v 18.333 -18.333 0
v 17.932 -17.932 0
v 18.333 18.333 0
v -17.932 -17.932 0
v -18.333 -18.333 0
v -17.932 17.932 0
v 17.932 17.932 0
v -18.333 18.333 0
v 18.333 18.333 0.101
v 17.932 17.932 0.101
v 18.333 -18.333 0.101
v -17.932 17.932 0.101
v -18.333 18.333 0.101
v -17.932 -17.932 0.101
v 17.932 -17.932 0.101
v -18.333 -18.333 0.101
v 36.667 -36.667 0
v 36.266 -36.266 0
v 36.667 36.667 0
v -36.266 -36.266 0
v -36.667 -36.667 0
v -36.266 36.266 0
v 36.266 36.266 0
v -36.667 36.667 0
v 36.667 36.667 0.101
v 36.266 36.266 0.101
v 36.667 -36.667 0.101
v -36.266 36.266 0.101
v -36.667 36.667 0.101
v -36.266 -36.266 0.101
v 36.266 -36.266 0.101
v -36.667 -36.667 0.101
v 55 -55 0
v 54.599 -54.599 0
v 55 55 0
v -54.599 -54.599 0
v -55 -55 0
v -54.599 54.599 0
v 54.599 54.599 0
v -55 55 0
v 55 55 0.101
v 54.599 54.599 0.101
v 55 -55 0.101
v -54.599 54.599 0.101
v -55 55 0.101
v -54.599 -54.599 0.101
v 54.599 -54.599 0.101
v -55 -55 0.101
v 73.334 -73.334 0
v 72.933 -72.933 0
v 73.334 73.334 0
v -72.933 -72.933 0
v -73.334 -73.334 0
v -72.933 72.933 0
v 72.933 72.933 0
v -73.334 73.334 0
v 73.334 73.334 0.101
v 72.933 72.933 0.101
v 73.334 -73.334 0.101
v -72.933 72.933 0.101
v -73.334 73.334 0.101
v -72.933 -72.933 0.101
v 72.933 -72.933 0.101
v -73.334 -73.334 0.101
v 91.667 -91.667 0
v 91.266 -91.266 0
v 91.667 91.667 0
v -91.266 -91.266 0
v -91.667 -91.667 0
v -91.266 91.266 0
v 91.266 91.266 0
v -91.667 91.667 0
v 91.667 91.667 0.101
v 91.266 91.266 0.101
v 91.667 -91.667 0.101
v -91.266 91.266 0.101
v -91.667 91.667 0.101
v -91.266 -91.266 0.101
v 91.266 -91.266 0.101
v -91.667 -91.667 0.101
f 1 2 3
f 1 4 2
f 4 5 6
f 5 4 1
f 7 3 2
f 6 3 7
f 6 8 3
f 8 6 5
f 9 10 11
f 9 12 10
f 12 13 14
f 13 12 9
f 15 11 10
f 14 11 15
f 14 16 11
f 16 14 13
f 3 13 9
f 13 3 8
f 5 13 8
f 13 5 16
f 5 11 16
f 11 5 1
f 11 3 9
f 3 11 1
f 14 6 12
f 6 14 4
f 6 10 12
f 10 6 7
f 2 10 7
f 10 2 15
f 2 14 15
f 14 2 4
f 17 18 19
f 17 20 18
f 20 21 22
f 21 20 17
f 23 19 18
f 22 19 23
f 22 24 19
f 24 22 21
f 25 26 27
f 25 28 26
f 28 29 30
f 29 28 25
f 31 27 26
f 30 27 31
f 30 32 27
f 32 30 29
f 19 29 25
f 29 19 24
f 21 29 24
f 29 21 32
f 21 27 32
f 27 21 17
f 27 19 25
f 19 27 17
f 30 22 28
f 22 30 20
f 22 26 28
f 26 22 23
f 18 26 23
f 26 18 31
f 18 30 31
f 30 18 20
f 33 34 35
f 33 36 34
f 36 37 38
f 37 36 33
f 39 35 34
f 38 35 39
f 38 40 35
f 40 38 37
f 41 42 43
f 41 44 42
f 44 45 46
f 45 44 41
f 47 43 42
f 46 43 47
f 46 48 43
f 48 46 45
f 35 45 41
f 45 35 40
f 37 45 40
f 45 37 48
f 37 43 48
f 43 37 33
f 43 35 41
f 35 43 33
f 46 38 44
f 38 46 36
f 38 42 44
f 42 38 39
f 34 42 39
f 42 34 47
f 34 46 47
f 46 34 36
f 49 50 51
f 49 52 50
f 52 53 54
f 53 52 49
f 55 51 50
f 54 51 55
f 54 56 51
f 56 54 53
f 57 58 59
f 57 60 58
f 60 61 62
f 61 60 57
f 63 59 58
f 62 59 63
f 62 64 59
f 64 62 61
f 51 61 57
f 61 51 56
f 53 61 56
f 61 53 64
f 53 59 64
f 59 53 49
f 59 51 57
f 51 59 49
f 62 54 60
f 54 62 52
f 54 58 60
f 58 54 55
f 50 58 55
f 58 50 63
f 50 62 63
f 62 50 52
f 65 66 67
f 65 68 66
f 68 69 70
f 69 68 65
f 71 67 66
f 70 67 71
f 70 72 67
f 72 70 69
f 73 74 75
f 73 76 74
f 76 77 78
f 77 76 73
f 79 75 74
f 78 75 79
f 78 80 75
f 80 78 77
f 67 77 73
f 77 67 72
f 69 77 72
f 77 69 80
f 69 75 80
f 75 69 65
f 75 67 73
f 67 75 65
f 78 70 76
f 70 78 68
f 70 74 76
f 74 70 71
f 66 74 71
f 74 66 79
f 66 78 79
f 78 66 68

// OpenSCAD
// OpenSCAD Template v1.6

/* [General Parameters] */
// The width of the print area (side to side along the X-axis)
Print_Area_Width = 220.001;

// The length of the print area (front to back along the Y-axis)
Print_Area_Depth = 220.001;

// The width of the ring lines
Line_Width = 0.401;

// The height to print at
Ring_Height = .101;

// The number of rings to print
Ring_Count = 5;



/* [Development Parameters] */
// Orient the model for creating a screenshot
Orient_for_Screenshot = false;

// The viewport distance for the screenshot 
Screenshot_Vpd = 550.78;

// The viewport field of view for the screenshot
Screenshot_Vpf = 22.50;

// The viewport rotation for the screenshot
Screenshot_Vpr = [ 0.00, 0.00, 0.00 ];

// The viewport translation for the screenshot
Screenshot_Vpt = [ 8.10, 0.44, -4.44 ];




module Generate()
{
    width_delta = Print_Area_Width / (Ring_Count + 1);
    length_delta = Print_Area_Depth / (Ring_Count + 1);

    for (ring_num = [0: Ring_Count])
    {
        width = width_delta * ring_num;
        length = length_delta * ring_num;
        Generate_Ring([width, length]);
    }
}



module Generate_Ring(size)
{
    linear_extrude(Ring_Height)
    difference()
    {
        square(size, center=true);
        square(size - [Line_Width*2, Line_Width*2], center=true);
    }
}


// Generate the model
Generate();

// Orient the viewport
$vpd = Orient_for_Screenshot ? Screenshot_Vpd : $vpd;
$vpf = Orient_for_Screenshot ? Screenshot_Vpf : $vpf;
$vpr = Orient_for_Screenshot ? Screenshot_Vpr : $vpr;
$vpt = Orient_for_Screenshot ? Screenshot_Vpt : $vpt;
